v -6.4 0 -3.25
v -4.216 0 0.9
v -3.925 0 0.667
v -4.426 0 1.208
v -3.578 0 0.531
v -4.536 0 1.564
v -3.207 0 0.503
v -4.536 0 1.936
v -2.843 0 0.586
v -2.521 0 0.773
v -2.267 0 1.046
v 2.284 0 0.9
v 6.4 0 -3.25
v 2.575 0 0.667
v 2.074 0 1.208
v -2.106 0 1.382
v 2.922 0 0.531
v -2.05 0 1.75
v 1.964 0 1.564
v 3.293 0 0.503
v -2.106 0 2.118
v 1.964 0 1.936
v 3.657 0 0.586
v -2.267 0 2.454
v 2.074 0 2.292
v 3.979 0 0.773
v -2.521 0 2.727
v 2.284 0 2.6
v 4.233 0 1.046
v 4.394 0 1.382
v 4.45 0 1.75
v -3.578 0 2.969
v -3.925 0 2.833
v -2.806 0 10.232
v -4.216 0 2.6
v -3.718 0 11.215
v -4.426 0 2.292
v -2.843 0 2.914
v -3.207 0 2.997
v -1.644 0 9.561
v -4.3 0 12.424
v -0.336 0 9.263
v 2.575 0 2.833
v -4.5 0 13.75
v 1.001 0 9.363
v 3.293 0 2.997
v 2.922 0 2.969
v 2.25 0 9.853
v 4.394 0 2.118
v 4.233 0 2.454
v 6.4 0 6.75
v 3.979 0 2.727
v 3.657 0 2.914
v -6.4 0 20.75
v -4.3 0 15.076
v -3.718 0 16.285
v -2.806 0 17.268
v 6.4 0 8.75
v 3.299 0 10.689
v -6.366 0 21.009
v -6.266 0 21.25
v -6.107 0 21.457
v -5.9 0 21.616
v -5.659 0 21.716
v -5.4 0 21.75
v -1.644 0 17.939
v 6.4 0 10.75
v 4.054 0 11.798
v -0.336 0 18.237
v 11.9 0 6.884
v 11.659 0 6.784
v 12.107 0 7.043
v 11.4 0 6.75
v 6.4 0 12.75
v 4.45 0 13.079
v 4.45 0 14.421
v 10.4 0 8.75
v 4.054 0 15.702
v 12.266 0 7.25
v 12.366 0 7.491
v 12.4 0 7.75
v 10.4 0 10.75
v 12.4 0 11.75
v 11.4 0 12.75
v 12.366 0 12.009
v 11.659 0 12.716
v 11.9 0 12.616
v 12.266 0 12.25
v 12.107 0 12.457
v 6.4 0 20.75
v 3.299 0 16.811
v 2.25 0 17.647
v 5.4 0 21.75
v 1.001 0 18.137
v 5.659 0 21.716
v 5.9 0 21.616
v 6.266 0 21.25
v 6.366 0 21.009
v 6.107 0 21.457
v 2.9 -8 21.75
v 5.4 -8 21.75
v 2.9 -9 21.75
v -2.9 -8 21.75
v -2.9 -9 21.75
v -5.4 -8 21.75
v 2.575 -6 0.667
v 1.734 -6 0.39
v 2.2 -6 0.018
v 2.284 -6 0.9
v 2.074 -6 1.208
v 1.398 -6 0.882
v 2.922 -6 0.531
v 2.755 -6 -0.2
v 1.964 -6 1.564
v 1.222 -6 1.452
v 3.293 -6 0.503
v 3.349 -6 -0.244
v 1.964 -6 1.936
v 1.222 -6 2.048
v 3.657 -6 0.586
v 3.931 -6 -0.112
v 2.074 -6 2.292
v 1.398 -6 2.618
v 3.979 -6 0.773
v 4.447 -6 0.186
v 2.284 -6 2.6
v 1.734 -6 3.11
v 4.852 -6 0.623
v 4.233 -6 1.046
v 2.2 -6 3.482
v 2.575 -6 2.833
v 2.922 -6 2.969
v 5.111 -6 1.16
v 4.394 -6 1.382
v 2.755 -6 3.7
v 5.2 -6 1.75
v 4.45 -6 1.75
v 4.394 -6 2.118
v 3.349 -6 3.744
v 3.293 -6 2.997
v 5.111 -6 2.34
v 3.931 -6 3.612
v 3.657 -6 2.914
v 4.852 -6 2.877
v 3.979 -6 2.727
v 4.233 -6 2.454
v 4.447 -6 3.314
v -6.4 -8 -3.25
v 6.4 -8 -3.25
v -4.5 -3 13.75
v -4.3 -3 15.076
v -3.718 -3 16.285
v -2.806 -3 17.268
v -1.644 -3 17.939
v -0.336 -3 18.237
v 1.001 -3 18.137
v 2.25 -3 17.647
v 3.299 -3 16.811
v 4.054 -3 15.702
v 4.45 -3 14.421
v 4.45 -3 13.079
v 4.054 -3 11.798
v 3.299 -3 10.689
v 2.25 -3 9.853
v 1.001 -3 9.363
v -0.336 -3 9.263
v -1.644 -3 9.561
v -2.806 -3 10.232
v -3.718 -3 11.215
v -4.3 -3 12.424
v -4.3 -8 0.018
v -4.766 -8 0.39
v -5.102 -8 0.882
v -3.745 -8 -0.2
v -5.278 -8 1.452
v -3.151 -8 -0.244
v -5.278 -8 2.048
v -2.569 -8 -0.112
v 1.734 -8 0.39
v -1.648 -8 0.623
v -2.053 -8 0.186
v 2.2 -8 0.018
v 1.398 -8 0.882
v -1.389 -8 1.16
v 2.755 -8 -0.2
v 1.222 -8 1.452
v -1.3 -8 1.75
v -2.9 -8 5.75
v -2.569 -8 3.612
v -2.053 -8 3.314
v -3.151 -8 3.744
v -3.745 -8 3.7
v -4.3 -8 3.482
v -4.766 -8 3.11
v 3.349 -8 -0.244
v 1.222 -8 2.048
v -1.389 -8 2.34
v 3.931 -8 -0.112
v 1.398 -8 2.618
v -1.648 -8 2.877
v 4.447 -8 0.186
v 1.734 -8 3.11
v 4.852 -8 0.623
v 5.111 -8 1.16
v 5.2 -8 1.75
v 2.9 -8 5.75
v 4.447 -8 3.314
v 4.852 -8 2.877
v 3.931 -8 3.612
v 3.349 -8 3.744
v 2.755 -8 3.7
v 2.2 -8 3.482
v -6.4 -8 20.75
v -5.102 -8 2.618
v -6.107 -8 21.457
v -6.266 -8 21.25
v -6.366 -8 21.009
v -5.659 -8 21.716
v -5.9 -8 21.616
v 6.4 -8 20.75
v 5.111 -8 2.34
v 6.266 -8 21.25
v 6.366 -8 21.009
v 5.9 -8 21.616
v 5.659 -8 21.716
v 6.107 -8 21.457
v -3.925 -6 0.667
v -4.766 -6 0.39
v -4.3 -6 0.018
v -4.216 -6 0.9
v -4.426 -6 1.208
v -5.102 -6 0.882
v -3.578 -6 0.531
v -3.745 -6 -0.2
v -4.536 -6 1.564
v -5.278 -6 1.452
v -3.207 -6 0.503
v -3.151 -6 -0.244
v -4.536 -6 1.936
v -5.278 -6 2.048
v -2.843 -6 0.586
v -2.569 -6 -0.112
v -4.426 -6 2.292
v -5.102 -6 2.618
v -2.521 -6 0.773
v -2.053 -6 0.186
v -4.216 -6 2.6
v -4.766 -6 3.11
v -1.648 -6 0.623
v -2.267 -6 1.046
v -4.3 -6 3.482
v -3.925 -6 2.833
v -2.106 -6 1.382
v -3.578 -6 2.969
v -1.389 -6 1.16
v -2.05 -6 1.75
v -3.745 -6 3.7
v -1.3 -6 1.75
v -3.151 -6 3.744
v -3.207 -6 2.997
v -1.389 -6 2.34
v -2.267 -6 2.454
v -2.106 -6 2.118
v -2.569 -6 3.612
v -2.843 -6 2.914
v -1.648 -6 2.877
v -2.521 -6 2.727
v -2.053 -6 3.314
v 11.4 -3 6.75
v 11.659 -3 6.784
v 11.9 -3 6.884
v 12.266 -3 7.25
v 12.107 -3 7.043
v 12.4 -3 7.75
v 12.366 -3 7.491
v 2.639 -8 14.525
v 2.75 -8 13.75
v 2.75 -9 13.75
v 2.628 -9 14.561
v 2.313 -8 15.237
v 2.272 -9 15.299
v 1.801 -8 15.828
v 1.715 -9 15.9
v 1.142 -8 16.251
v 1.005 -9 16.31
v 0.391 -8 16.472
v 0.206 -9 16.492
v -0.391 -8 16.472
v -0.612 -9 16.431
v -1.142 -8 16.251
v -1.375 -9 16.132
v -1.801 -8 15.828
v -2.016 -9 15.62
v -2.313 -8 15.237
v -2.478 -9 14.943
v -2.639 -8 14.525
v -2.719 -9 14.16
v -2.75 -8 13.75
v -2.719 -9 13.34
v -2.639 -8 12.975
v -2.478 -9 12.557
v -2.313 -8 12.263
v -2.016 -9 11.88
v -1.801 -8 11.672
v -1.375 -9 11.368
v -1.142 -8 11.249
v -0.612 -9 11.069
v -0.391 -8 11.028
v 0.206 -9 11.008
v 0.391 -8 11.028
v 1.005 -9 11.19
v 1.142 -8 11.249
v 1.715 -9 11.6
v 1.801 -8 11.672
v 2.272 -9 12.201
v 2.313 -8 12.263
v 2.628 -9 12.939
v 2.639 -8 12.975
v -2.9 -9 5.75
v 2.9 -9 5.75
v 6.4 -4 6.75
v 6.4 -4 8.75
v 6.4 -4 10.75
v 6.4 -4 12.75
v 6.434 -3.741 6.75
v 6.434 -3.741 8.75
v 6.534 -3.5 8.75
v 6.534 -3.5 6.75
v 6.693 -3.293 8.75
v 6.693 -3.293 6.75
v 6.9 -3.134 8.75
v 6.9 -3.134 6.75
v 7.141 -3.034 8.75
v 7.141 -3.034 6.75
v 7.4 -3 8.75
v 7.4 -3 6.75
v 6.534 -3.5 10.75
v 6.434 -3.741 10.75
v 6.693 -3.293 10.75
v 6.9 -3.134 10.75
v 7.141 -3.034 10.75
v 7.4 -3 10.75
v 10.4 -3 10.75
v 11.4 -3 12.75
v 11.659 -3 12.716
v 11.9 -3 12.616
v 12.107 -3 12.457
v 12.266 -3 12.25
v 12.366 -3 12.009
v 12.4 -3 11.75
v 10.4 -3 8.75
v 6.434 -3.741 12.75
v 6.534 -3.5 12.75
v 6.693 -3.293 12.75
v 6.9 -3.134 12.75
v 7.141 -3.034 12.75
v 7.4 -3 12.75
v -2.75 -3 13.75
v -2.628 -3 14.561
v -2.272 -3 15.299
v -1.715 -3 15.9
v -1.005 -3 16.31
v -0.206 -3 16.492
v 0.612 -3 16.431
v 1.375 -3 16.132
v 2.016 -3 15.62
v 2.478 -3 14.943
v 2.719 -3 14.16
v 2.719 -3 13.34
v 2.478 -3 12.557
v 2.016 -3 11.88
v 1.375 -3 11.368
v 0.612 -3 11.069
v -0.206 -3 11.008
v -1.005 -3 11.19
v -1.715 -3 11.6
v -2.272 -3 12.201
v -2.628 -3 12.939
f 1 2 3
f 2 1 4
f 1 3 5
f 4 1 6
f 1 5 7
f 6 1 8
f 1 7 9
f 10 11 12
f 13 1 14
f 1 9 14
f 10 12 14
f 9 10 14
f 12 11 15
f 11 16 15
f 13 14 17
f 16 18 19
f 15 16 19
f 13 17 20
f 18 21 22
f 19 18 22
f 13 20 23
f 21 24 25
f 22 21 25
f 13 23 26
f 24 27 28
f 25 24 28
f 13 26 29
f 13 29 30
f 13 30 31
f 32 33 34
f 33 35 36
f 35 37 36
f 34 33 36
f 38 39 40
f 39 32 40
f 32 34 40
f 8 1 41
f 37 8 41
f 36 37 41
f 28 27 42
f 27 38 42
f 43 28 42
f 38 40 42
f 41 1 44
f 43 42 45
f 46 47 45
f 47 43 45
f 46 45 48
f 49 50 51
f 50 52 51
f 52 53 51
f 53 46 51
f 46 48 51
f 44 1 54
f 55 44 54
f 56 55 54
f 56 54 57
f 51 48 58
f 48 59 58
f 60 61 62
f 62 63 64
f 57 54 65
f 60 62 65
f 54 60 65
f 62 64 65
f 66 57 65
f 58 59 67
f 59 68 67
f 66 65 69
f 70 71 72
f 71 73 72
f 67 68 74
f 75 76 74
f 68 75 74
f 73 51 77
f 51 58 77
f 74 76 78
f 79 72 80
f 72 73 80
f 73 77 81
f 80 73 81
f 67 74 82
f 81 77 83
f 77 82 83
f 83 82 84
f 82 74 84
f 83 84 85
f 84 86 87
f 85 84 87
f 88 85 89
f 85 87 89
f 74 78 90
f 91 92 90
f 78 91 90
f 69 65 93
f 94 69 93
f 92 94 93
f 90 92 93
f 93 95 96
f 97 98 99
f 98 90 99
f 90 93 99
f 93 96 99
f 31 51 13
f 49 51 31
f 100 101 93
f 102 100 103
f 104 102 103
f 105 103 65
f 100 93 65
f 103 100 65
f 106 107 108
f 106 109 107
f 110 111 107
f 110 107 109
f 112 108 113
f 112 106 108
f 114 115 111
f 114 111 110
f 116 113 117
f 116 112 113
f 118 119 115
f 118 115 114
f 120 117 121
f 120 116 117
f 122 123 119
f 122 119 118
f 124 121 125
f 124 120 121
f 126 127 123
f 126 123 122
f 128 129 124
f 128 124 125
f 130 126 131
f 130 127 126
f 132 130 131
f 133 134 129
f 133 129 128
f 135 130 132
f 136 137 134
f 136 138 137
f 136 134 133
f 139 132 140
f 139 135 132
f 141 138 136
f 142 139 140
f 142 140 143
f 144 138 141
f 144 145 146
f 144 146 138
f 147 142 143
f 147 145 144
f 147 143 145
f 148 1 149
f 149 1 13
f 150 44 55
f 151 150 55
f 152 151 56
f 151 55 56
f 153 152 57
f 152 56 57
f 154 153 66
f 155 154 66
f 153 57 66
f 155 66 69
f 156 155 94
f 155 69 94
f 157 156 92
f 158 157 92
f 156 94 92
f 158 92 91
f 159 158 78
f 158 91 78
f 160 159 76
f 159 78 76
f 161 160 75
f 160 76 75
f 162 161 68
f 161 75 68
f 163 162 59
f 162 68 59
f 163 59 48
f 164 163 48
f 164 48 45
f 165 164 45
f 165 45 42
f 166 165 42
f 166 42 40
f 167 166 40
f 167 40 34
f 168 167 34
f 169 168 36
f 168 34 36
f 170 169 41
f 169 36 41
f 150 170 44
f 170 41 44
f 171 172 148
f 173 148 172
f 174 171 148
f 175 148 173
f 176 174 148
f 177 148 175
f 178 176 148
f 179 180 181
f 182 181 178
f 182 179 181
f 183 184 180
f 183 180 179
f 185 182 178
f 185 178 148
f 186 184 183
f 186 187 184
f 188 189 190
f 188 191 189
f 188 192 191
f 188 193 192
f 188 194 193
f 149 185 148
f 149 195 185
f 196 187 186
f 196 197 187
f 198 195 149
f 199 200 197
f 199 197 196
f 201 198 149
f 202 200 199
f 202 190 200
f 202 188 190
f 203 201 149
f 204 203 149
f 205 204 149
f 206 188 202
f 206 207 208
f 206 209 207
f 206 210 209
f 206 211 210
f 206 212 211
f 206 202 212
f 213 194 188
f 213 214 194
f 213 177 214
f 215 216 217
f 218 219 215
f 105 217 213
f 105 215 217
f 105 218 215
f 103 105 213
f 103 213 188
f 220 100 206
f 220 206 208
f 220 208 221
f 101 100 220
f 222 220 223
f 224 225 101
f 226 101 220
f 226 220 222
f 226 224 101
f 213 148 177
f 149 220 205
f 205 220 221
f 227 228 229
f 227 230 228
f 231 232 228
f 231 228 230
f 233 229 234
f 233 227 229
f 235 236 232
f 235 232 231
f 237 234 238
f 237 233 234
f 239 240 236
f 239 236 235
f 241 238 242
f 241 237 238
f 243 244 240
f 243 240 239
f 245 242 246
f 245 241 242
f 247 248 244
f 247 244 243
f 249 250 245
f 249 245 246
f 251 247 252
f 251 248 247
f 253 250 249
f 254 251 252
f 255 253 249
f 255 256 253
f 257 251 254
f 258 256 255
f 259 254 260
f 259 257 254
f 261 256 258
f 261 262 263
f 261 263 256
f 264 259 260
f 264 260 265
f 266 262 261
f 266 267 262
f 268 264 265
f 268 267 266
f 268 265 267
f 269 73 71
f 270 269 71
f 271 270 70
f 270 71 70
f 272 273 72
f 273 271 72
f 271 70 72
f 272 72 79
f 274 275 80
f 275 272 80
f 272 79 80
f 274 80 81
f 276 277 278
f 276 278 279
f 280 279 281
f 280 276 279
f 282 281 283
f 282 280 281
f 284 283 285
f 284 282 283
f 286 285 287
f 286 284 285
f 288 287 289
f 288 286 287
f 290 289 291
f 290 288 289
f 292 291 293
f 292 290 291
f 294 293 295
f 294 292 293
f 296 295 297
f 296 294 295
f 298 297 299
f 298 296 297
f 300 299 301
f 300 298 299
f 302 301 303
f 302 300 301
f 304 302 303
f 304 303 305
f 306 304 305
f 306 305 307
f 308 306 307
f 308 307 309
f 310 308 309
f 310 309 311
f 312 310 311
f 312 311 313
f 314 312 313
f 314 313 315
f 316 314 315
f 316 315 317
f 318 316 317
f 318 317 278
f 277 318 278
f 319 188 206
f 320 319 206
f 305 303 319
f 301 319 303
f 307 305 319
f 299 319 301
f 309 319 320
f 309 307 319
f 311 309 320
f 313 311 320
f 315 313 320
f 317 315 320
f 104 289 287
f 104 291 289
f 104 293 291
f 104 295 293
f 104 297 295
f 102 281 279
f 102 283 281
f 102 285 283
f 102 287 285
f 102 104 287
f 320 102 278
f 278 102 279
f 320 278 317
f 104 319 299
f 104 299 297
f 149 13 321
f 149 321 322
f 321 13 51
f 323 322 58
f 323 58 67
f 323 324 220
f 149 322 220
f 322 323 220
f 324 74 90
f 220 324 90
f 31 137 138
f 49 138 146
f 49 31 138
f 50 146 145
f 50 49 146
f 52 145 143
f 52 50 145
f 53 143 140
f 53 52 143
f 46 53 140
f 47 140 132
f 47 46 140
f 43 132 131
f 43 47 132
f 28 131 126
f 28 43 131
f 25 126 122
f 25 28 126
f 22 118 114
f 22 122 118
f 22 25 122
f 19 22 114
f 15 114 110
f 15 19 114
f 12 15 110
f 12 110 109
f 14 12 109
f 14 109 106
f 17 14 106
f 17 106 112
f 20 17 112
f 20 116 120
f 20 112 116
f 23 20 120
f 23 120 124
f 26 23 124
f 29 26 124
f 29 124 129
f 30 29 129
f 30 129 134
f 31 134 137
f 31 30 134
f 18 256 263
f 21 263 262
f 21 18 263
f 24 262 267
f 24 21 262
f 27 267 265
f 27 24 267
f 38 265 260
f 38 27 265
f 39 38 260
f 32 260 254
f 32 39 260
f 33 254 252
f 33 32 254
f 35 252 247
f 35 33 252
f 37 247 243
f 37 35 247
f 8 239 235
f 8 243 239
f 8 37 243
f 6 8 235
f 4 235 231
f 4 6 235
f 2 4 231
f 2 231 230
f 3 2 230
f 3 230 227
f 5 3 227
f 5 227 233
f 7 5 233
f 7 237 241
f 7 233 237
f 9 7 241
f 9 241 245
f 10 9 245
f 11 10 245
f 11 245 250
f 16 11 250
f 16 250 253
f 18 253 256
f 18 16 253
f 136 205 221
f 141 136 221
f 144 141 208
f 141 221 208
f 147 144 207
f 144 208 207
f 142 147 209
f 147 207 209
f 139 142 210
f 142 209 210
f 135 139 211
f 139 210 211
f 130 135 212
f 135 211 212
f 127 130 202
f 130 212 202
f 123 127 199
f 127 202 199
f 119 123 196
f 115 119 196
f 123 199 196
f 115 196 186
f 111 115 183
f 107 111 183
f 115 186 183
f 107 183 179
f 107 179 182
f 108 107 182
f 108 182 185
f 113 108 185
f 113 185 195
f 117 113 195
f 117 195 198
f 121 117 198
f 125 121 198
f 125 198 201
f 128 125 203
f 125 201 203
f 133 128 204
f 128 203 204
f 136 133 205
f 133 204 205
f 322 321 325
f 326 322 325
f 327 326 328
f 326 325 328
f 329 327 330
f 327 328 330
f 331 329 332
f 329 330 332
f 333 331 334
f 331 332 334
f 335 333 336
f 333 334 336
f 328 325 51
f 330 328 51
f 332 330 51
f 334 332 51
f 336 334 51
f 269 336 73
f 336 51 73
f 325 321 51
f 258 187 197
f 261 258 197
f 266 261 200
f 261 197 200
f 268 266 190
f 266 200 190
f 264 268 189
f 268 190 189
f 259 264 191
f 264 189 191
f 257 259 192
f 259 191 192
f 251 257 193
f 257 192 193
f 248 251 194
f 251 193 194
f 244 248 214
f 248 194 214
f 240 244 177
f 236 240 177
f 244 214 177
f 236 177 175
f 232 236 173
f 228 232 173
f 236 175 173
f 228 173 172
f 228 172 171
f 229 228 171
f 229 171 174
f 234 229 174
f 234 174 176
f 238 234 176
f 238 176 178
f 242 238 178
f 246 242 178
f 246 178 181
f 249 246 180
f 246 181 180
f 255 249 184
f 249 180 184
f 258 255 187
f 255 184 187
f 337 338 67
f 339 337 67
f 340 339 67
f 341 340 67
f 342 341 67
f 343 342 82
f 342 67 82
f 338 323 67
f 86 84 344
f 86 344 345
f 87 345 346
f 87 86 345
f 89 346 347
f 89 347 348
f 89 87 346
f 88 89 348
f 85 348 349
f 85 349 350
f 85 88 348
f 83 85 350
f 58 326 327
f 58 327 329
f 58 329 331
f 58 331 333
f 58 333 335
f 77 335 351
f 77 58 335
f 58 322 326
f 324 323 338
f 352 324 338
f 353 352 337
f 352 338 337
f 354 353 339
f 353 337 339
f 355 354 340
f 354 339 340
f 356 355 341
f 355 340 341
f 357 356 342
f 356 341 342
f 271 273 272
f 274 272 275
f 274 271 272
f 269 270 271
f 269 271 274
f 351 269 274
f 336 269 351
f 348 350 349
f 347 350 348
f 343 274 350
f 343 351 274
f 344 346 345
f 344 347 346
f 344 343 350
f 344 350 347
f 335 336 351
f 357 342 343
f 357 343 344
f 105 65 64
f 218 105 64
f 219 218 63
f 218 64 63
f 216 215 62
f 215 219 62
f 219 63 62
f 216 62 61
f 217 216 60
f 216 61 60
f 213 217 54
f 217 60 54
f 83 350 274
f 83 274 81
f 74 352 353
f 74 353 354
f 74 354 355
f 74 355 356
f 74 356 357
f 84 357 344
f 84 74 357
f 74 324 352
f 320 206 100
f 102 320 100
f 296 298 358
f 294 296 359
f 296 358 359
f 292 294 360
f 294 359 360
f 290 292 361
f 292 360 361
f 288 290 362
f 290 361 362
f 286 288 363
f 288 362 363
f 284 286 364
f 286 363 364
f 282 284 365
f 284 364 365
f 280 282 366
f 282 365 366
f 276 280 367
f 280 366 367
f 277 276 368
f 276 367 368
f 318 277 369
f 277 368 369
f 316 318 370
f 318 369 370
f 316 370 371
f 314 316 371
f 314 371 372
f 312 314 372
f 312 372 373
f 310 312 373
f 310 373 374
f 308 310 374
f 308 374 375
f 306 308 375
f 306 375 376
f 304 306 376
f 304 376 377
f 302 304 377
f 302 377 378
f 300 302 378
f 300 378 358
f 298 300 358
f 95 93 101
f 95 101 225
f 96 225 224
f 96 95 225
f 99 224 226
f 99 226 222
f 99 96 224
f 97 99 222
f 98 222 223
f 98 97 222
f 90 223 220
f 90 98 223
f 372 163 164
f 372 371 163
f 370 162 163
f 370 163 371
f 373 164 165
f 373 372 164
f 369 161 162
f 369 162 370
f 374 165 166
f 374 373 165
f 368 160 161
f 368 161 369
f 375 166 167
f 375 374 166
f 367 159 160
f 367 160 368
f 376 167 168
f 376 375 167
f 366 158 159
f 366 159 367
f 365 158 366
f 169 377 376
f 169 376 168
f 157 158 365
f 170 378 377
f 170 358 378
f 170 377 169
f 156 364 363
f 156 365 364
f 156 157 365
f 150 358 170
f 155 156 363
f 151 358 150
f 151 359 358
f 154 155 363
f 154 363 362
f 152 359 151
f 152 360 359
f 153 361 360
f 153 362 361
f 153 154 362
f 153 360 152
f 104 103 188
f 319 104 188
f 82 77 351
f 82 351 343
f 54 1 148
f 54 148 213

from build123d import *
from build123d import SkipClean  # not in build123d's __all__

# Parameters (mm, degrees)
F1_W          = 12.8
F1_H          = 25
F1_R          = 1.25
F2_DEPTH      = 8
F3_R          = 2.75
F4_DEPTH      = 8.001
F5_R          = 2
F6_DEPTH      = 2
F7_R          = 2.75
F8_DEPTH      = 1
F9_W          = 3
F9_H          = 6
F10_DEPTH     = 6
F11_W         = 4
F11_H         = 2
F12_DEPTH     = 3
F13_T1_DEPTH  = 2
F13_T3_DEPTH  = 2
F13_T8_DEPTH  = 4.5
F13_T13_DEPTH = 4.5
F13_T15_DEPTH = 8
F13_T17_DEPTH = 13
F14_R         = 4.5
F15_DEPTH     = 3


# Not quite as in the source:
# - a fillet or chamfer that OpenCascade refuses, or shapes differently, is made with other operations: its cross-section is extruded or revolved along the edge and cut away or added
# - after a boolean that leaves OpenCascade's solid faulty, fix() repairs it


with BuildPart() as f2:
    # F1 (on Front) → F2 (new body)
    with BuildSketch(Plane.XZ):
        with Locations((0, 9.25)):
            Rectangle(F1_W, F1_H)
        with Locations((-3.3, 1.75)):
            Circle(F1_R, mode=Mode.SUBTRACT)
        with Locations((3.2, 1.75)):
            Circle(F1_R, mode=Mode.SUBTRACT)
    extrude(amount=F2_DEPTH)

    # F3 (on face) → F4 (cut, through all)
    with BuildSketch(Plane(origin=(0, 0, 0), x_dir=(-1, 0, 0), z_dir=(0, 1, 0))):
        with Locations((0, 13.75)):
            Circle(F3_R)
    extrude(amount=-F4_DEPTH, mode=Mode.SUBTRACT)

    # F5 (on face) → F6 (cut)
    with BuildSketch(Plane.XZ.offset(8)):
        with Locations((-3.3, 1.75)):
            Circle(F5_R)
        with Locations((3.2, 1.75)):
            Circle(F5_R)
    extrude(amount=-F6_DEPTH, mode=Mode.SUBTRACT)

    # F7 (on face) → F8 (join)
    with BuildSketch(Plane.XZ.offset(8)):
        Polygon((-2.9, 5.75), (0, 5.75), (2.9, 5.75), (2.9, 21.75), (0, 21.75), (-2.9, 21.75), align=None)
        with Locations((0, 13.75)):
            Circle(F7_R, mode=Mode.SUBTRACT)
    with SkipClean():  # cleaning this boolean's faces spoils the solid; the shape is the same uncleaned
        extrude(amount=F8_DEPTH)

    # F9 (on face) → F10 (join)
    with BuildSketch(Plane.YZ.offset(6.4)):
        with Locations((-1.5, 9.75)):
            Rectangle(F9_W, F9_H)
    extrude(amount=F10_DEPTH)

    add(f2.part.fix(), mode=Mode.REPLACE)

    # F11 (on face) → F12 (cut, through all)
    with BuildSketch(Plane(origin=(0, 0, 0), x_dir=(-1, 0, 0), z_dir=(0, 1, 0))):
        with Locations((-8.4, 9.75)):
            Rectangle(F11_W, F11_H)
    extrude(amount=-F12_DEPTH, mode=Mode.SUBTRACT)

    add(f2.part.fix(), mode=Mode.REPLACE)

    # F13: fillet of radius 1 on 6 edges, made by hand

    # F13_s2 → F13_t1 (join)
    with BuildSketch(Plane.XY.offset(10.75)):
        with BuildLine():
            ThreePointArc((6.4, -4), (6.6928932188, -3.2928932188), (7.4, -3))
            Line((7.4, -3), (6.4, -3))
            Line((6.4, -3), (6.4, -4))
        make_face()
    extrude(amount=F13_T1_DEPTH)

    # F13_s4 → F13_t3 (join)
    with BuildSketch(Plane.XY.offset(6.75)):
        with BuildLine():
            ThreePointArc((6.4, -4), (6.6928932188, -3.2928932188), (7.4, -3))
            Line((7.4, -3), (6.4, -3))
            Line((6.4, -3), (6.4, -4))
        make_face()
    extrude(amount=F13_T3_DEPTH)


with BuildPart() as f13_tool6:
    # F13_s7 → F13_t8 (new body)
    with BuildSketch(Plane.XY.offset(12.75)):
        with BuildLine():
            ThreePointArc((6.4, -4), (6.6928932188, -3.2928932188), (7.4, -3))
            Line((7.4, -3), (6.4, -3))
            Line((6.4, -3), (6.4, -4))
        make_face()
    extrude(amount=-F13_T8_DEPTH)

    split(bisect_by=Plane.XY.offset(8.75), keep=Keep.BOTTOM)


with BuildPart() as f2_1:
    add(f2.part, clean=False)

    # F13_t5: union F13_tool6
    add(f13_tool6.part)


with BuildPart() as f13_tool11:
    # F13_s12 → F13_t13 (new body)
    with BuildSketch(Plane.XY.offset(11.25)):
        with BuildLine():
            ThreePointArc((6.4, -4), (6.6928932188, -3.2928932188), (7.4, -3))
            Line((7.4, -3), (6.4, -3))
            Line((6.4, -3), (6.4, -4))
        make_face()
    extrude(amount=-F13_T13_DEPTH)

    split(bisect_by=Plane.XY.offset(10.75), keep=Keep.TOP)


with BuildPart() as f2_2:
    add(f2_1.part, clean=False)

    # F13_t10: union F13_tool11
    add(f13_tool11.part)

    # F13_s16 → F13_t15 (cut)
    with BuildSketch(Plane.XZ.offset(-2.5)):
        with BuildLine():
            ThreePointArc((11.4, 6.75), (12.1071067812, 7.0428932188), (12.4, 7.75))
            Line((12.4, 7.75), (12.4, 6.75))
            Line((12.4, 6.75), (11.4, 6.75))
        make_face()
        with BuildLine():
            ThreePointArc((11.4, 12.75), (12.1071067812, 12.4571067812), (12.4, 11.75))
            Line((12.4, 11.75), (12.4, 12.75))
            Line((12.4, 12.75), (11.4, 12.75))
        make_face()
    extrude(amount=F13_T15_DEPTH, mode=Mode.SUBTRACT)

    # F13_s18 → F13_t17 (cut)
    with BuildSketch(Plane.XZ.offset(-2.5)):
        with BuildLine():
            ThreePointArc((5.4, 21.75), (6.1071067812, 21.4571067812), (6.4, 20.75))
            Line((6.4, 20.75), (6.4, 21.75))
            Line((6.4, 21.75), (5.4, 21.75))
        make_face()
        with BuildLine():
            ThreePointArc((-5.4, 21.75), (-6.1071067812, 21.4571067812), (-6.4, 20.75))
            Line((-6.4, 20.75), (-6.4, 21.75))
            Line((-6.4, 21.75), (-5.4, 21.75))
        make_face()
    extrude(amount=F13_T17_DEPTH, mode=Mode.SUBTRACT)

    # F14 (on face) → F15 (cut)
    with BuildSketch(Plane(origin=(0, 0, 0), x_dir=(-1, 0, 0), z_dir=(0, 1, 0))):
        with Locations((0, 13.75)):
            Circle(F14_R)
    extrude(amount=-F15_DEPTH, mode=Mode.SUBTRACT)


solid = f2_2.part
